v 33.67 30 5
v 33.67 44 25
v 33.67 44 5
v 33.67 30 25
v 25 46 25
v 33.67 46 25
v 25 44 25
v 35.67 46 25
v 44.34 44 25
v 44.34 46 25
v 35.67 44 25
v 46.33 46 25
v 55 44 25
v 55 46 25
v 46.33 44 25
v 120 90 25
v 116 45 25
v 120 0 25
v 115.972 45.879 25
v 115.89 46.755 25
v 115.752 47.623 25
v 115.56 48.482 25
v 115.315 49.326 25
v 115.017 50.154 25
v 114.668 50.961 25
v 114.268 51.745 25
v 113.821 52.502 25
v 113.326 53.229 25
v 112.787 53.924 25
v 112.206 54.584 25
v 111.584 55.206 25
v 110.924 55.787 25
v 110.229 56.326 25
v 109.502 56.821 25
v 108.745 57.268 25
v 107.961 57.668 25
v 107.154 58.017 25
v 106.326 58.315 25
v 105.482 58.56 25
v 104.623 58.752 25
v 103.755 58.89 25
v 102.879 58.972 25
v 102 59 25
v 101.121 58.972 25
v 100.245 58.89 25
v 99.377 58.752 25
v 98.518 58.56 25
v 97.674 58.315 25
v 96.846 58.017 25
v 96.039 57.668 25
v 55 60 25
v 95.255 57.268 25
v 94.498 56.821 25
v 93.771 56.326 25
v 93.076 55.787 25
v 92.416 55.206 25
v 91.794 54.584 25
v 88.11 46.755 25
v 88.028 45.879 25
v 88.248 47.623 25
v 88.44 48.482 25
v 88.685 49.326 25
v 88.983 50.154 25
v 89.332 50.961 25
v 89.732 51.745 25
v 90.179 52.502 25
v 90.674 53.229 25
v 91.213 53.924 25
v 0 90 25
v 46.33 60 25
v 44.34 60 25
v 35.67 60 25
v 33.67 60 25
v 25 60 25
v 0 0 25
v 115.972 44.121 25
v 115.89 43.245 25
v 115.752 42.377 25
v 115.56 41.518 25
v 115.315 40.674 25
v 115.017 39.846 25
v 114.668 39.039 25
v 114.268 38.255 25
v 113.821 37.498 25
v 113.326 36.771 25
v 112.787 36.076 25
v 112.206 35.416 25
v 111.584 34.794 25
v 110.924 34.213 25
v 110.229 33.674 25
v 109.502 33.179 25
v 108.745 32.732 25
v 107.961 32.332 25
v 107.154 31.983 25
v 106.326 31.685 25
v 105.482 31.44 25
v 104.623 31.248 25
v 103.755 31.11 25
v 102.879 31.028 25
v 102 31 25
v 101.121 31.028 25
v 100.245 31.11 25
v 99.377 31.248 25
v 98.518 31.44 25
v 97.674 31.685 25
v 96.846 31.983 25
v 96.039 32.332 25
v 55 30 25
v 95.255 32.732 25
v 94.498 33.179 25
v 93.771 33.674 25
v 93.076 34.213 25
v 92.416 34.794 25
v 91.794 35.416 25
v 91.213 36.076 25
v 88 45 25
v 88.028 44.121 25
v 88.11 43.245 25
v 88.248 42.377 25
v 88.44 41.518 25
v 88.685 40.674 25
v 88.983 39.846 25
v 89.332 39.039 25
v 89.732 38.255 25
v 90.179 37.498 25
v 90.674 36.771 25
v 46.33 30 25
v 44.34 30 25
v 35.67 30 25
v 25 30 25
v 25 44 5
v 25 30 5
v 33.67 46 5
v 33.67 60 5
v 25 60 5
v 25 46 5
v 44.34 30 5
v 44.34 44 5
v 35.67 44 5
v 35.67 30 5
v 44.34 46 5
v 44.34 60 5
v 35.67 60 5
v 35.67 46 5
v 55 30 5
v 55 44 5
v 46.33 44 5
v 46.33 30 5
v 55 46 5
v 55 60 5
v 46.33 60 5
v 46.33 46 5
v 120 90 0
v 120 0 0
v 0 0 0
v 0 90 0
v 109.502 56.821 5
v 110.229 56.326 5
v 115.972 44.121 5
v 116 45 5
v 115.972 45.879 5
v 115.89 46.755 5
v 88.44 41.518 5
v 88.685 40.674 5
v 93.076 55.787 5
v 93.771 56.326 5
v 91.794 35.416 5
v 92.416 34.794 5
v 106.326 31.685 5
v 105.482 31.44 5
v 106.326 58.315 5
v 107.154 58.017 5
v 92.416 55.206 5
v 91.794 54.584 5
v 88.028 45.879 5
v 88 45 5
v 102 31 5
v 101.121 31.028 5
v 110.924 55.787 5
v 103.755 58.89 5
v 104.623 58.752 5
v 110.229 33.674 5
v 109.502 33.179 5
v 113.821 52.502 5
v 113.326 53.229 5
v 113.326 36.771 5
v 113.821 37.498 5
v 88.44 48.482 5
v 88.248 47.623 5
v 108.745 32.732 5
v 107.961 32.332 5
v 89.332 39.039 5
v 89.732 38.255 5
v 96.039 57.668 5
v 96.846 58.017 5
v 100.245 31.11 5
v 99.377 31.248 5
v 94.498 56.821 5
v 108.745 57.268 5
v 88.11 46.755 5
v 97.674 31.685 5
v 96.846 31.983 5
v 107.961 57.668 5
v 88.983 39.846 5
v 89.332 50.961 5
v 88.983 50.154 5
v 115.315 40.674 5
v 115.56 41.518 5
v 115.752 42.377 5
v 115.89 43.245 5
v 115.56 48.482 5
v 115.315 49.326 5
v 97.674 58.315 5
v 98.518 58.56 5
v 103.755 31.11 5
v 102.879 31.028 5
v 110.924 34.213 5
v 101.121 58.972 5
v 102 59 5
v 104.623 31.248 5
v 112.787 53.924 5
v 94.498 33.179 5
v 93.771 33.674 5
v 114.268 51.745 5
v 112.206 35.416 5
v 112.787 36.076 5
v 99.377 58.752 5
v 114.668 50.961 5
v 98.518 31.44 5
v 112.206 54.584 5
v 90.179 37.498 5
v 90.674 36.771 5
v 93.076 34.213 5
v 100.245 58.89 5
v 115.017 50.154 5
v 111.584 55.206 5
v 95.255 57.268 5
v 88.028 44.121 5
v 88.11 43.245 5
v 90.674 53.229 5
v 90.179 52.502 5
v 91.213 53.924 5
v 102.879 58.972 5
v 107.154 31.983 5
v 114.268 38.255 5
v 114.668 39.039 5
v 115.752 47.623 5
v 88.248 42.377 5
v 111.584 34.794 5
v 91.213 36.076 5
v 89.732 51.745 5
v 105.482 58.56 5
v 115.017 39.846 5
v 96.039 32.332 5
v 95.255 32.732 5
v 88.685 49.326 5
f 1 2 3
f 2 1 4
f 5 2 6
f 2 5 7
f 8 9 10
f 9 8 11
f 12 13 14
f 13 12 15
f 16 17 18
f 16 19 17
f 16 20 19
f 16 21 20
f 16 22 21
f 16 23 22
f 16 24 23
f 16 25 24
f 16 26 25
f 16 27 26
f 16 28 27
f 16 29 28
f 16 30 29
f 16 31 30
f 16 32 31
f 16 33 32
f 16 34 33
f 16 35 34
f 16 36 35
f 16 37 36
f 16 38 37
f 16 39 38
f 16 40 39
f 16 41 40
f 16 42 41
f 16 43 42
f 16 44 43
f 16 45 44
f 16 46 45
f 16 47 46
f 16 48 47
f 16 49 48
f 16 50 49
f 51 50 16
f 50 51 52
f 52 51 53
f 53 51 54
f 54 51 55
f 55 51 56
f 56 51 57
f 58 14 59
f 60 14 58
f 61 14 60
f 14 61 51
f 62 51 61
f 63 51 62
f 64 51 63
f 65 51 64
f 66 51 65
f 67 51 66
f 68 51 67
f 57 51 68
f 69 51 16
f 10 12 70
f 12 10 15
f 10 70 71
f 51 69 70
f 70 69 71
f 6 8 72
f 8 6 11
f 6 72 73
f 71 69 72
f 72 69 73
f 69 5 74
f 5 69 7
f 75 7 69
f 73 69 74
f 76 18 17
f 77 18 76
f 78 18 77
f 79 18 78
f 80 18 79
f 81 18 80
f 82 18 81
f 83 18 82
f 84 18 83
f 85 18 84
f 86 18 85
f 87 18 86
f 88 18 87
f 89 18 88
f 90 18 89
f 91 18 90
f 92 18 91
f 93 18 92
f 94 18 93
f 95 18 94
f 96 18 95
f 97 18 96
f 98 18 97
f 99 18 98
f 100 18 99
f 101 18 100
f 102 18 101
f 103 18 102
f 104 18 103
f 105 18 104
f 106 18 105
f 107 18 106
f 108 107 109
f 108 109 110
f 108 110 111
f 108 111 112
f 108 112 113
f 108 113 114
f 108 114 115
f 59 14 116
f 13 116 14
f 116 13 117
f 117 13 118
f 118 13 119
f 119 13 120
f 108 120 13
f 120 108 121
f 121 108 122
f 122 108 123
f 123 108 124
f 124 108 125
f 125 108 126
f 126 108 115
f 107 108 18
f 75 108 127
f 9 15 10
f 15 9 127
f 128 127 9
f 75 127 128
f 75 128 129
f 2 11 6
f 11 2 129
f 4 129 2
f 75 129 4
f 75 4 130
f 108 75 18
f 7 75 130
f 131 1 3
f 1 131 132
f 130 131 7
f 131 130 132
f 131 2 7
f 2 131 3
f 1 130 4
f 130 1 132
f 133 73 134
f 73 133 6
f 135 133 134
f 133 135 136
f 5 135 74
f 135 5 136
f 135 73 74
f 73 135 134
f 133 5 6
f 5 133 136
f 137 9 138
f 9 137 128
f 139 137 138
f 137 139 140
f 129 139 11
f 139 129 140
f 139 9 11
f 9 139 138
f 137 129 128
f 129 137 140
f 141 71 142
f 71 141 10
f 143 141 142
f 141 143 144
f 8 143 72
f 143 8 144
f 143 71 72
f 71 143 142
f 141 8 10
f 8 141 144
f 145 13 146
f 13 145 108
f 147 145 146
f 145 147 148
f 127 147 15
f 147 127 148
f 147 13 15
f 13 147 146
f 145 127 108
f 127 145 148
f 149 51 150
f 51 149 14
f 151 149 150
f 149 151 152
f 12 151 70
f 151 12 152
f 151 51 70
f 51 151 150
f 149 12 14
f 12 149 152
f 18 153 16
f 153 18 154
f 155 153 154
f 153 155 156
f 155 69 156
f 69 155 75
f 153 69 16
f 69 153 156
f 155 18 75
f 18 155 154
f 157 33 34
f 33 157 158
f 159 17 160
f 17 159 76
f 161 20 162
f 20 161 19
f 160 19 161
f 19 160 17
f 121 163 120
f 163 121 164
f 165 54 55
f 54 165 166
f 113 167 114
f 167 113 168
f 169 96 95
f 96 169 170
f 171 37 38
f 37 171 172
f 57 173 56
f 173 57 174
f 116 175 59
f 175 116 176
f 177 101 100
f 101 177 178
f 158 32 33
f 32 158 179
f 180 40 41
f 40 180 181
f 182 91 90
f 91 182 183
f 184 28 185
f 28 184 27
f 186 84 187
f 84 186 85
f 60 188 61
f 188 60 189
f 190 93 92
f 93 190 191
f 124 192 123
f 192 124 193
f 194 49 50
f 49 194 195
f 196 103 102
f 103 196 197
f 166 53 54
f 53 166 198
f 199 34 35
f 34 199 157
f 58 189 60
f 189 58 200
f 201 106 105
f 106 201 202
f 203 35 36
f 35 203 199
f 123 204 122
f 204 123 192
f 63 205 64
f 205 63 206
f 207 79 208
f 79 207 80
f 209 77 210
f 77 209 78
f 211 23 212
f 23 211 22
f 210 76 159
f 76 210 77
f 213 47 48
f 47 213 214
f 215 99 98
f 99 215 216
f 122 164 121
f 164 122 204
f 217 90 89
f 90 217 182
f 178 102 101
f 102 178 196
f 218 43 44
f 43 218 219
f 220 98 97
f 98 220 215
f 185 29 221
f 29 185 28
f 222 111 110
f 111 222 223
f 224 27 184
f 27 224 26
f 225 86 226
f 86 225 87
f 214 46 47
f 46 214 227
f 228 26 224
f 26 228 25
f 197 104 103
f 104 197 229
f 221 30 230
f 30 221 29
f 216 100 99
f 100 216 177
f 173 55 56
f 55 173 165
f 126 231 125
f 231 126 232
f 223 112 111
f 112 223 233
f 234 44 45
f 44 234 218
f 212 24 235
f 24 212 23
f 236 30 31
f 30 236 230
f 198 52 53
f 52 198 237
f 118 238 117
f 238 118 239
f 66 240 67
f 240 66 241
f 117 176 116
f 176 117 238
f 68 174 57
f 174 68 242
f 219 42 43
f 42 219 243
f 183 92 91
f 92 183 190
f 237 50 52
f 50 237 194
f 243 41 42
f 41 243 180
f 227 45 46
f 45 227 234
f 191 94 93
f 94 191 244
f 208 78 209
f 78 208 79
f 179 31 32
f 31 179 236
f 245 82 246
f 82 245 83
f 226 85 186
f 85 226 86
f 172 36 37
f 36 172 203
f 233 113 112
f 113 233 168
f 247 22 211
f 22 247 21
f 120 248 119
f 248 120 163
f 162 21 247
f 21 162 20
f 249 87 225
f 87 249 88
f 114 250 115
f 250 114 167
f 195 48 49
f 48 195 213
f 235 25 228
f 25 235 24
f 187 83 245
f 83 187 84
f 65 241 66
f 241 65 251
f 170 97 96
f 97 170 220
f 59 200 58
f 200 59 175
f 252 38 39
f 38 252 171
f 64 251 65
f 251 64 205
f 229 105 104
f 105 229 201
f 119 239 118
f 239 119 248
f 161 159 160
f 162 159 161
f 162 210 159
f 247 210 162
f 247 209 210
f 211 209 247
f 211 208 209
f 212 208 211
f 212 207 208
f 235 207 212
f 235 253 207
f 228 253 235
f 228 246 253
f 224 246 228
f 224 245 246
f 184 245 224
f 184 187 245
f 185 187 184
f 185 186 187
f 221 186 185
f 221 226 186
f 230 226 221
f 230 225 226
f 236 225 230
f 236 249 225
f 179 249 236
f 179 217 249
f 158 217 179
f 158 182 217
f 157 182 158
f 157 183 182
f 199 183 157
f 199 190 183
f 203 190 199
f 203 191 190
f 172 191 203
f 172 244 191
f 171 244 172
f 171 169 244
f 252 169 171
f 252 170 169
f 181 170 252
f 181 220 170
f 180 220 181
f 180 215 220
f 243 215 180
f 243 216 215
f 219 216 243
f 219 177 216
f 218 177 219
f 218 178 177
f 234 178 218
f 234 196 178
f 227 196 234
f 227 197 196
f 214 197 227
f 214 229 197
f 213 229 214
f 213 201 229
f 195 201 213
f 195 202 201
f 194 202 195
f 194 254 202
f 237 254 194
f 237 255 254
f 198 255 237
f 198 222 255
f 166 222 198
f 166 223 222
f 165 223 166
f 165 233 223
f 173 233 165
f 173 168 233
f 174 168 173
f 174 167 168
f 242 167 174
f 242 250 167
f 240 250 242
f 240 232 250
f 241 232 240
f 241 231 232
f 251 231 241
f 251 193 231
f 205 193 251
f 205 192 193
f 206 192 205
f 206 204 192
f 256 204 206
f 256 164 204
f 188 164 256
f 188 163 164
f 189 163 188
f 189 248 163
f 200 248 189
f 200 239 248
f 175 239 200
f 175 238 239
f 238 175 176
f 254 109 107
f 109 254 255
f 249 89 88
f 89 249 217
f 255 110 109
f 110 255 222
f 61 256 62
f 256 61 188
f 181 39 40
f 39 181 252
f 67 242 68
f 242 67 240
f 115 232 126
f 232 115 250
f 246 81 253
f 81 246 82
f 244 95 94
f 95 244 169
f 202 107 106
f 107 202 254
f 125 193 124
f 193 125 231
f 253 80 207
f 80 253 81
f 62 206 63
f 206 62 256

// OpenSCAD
$fn=48;
translate([0,0,0])
{
difference()
{
    cube(size = [120.00, 90.00, 25.00], center = false); 
    translate(v = [25.00, 30.00, 5.00])
    {
        union()
        {
            cube(size = [8.67, 14.00, 20.00], center = false); 
            translate(v = [0.00, 16.00, 0.00])
            {
                cube(size = [8.67, 14.00, 20.00], center = false); 
            }
            translate(v = [10.67, 0.00, 0.00])
            {
                cube(size = [8.67, 14.00, 20.00], center = false); 
            }
            translate(v = [10.67, 16.00, 0.00])
            {
                cube(size = [8.67, 14.00, 20.00], center = false); 
            }
            translate(v = [21.33, 0.00, 0.00])
            {
                cube(size = [8.67, 14.00, 20.00], center = false); 
            }
            translate(v = [21.33, 16.00, 0.00])
            {
                cube(size = [8.67, 14.00, 20.00], center = false); 
            }
        }
    }
    translate(v = [88.00, 31.00, 5.00])
    {
        translate(v = [14.00, 14.00, 0.00])
        {
            cylinder(center = false, r1 = 14, r2 = 14, h = 20, $fn = 100);
        }
    }
}

}
